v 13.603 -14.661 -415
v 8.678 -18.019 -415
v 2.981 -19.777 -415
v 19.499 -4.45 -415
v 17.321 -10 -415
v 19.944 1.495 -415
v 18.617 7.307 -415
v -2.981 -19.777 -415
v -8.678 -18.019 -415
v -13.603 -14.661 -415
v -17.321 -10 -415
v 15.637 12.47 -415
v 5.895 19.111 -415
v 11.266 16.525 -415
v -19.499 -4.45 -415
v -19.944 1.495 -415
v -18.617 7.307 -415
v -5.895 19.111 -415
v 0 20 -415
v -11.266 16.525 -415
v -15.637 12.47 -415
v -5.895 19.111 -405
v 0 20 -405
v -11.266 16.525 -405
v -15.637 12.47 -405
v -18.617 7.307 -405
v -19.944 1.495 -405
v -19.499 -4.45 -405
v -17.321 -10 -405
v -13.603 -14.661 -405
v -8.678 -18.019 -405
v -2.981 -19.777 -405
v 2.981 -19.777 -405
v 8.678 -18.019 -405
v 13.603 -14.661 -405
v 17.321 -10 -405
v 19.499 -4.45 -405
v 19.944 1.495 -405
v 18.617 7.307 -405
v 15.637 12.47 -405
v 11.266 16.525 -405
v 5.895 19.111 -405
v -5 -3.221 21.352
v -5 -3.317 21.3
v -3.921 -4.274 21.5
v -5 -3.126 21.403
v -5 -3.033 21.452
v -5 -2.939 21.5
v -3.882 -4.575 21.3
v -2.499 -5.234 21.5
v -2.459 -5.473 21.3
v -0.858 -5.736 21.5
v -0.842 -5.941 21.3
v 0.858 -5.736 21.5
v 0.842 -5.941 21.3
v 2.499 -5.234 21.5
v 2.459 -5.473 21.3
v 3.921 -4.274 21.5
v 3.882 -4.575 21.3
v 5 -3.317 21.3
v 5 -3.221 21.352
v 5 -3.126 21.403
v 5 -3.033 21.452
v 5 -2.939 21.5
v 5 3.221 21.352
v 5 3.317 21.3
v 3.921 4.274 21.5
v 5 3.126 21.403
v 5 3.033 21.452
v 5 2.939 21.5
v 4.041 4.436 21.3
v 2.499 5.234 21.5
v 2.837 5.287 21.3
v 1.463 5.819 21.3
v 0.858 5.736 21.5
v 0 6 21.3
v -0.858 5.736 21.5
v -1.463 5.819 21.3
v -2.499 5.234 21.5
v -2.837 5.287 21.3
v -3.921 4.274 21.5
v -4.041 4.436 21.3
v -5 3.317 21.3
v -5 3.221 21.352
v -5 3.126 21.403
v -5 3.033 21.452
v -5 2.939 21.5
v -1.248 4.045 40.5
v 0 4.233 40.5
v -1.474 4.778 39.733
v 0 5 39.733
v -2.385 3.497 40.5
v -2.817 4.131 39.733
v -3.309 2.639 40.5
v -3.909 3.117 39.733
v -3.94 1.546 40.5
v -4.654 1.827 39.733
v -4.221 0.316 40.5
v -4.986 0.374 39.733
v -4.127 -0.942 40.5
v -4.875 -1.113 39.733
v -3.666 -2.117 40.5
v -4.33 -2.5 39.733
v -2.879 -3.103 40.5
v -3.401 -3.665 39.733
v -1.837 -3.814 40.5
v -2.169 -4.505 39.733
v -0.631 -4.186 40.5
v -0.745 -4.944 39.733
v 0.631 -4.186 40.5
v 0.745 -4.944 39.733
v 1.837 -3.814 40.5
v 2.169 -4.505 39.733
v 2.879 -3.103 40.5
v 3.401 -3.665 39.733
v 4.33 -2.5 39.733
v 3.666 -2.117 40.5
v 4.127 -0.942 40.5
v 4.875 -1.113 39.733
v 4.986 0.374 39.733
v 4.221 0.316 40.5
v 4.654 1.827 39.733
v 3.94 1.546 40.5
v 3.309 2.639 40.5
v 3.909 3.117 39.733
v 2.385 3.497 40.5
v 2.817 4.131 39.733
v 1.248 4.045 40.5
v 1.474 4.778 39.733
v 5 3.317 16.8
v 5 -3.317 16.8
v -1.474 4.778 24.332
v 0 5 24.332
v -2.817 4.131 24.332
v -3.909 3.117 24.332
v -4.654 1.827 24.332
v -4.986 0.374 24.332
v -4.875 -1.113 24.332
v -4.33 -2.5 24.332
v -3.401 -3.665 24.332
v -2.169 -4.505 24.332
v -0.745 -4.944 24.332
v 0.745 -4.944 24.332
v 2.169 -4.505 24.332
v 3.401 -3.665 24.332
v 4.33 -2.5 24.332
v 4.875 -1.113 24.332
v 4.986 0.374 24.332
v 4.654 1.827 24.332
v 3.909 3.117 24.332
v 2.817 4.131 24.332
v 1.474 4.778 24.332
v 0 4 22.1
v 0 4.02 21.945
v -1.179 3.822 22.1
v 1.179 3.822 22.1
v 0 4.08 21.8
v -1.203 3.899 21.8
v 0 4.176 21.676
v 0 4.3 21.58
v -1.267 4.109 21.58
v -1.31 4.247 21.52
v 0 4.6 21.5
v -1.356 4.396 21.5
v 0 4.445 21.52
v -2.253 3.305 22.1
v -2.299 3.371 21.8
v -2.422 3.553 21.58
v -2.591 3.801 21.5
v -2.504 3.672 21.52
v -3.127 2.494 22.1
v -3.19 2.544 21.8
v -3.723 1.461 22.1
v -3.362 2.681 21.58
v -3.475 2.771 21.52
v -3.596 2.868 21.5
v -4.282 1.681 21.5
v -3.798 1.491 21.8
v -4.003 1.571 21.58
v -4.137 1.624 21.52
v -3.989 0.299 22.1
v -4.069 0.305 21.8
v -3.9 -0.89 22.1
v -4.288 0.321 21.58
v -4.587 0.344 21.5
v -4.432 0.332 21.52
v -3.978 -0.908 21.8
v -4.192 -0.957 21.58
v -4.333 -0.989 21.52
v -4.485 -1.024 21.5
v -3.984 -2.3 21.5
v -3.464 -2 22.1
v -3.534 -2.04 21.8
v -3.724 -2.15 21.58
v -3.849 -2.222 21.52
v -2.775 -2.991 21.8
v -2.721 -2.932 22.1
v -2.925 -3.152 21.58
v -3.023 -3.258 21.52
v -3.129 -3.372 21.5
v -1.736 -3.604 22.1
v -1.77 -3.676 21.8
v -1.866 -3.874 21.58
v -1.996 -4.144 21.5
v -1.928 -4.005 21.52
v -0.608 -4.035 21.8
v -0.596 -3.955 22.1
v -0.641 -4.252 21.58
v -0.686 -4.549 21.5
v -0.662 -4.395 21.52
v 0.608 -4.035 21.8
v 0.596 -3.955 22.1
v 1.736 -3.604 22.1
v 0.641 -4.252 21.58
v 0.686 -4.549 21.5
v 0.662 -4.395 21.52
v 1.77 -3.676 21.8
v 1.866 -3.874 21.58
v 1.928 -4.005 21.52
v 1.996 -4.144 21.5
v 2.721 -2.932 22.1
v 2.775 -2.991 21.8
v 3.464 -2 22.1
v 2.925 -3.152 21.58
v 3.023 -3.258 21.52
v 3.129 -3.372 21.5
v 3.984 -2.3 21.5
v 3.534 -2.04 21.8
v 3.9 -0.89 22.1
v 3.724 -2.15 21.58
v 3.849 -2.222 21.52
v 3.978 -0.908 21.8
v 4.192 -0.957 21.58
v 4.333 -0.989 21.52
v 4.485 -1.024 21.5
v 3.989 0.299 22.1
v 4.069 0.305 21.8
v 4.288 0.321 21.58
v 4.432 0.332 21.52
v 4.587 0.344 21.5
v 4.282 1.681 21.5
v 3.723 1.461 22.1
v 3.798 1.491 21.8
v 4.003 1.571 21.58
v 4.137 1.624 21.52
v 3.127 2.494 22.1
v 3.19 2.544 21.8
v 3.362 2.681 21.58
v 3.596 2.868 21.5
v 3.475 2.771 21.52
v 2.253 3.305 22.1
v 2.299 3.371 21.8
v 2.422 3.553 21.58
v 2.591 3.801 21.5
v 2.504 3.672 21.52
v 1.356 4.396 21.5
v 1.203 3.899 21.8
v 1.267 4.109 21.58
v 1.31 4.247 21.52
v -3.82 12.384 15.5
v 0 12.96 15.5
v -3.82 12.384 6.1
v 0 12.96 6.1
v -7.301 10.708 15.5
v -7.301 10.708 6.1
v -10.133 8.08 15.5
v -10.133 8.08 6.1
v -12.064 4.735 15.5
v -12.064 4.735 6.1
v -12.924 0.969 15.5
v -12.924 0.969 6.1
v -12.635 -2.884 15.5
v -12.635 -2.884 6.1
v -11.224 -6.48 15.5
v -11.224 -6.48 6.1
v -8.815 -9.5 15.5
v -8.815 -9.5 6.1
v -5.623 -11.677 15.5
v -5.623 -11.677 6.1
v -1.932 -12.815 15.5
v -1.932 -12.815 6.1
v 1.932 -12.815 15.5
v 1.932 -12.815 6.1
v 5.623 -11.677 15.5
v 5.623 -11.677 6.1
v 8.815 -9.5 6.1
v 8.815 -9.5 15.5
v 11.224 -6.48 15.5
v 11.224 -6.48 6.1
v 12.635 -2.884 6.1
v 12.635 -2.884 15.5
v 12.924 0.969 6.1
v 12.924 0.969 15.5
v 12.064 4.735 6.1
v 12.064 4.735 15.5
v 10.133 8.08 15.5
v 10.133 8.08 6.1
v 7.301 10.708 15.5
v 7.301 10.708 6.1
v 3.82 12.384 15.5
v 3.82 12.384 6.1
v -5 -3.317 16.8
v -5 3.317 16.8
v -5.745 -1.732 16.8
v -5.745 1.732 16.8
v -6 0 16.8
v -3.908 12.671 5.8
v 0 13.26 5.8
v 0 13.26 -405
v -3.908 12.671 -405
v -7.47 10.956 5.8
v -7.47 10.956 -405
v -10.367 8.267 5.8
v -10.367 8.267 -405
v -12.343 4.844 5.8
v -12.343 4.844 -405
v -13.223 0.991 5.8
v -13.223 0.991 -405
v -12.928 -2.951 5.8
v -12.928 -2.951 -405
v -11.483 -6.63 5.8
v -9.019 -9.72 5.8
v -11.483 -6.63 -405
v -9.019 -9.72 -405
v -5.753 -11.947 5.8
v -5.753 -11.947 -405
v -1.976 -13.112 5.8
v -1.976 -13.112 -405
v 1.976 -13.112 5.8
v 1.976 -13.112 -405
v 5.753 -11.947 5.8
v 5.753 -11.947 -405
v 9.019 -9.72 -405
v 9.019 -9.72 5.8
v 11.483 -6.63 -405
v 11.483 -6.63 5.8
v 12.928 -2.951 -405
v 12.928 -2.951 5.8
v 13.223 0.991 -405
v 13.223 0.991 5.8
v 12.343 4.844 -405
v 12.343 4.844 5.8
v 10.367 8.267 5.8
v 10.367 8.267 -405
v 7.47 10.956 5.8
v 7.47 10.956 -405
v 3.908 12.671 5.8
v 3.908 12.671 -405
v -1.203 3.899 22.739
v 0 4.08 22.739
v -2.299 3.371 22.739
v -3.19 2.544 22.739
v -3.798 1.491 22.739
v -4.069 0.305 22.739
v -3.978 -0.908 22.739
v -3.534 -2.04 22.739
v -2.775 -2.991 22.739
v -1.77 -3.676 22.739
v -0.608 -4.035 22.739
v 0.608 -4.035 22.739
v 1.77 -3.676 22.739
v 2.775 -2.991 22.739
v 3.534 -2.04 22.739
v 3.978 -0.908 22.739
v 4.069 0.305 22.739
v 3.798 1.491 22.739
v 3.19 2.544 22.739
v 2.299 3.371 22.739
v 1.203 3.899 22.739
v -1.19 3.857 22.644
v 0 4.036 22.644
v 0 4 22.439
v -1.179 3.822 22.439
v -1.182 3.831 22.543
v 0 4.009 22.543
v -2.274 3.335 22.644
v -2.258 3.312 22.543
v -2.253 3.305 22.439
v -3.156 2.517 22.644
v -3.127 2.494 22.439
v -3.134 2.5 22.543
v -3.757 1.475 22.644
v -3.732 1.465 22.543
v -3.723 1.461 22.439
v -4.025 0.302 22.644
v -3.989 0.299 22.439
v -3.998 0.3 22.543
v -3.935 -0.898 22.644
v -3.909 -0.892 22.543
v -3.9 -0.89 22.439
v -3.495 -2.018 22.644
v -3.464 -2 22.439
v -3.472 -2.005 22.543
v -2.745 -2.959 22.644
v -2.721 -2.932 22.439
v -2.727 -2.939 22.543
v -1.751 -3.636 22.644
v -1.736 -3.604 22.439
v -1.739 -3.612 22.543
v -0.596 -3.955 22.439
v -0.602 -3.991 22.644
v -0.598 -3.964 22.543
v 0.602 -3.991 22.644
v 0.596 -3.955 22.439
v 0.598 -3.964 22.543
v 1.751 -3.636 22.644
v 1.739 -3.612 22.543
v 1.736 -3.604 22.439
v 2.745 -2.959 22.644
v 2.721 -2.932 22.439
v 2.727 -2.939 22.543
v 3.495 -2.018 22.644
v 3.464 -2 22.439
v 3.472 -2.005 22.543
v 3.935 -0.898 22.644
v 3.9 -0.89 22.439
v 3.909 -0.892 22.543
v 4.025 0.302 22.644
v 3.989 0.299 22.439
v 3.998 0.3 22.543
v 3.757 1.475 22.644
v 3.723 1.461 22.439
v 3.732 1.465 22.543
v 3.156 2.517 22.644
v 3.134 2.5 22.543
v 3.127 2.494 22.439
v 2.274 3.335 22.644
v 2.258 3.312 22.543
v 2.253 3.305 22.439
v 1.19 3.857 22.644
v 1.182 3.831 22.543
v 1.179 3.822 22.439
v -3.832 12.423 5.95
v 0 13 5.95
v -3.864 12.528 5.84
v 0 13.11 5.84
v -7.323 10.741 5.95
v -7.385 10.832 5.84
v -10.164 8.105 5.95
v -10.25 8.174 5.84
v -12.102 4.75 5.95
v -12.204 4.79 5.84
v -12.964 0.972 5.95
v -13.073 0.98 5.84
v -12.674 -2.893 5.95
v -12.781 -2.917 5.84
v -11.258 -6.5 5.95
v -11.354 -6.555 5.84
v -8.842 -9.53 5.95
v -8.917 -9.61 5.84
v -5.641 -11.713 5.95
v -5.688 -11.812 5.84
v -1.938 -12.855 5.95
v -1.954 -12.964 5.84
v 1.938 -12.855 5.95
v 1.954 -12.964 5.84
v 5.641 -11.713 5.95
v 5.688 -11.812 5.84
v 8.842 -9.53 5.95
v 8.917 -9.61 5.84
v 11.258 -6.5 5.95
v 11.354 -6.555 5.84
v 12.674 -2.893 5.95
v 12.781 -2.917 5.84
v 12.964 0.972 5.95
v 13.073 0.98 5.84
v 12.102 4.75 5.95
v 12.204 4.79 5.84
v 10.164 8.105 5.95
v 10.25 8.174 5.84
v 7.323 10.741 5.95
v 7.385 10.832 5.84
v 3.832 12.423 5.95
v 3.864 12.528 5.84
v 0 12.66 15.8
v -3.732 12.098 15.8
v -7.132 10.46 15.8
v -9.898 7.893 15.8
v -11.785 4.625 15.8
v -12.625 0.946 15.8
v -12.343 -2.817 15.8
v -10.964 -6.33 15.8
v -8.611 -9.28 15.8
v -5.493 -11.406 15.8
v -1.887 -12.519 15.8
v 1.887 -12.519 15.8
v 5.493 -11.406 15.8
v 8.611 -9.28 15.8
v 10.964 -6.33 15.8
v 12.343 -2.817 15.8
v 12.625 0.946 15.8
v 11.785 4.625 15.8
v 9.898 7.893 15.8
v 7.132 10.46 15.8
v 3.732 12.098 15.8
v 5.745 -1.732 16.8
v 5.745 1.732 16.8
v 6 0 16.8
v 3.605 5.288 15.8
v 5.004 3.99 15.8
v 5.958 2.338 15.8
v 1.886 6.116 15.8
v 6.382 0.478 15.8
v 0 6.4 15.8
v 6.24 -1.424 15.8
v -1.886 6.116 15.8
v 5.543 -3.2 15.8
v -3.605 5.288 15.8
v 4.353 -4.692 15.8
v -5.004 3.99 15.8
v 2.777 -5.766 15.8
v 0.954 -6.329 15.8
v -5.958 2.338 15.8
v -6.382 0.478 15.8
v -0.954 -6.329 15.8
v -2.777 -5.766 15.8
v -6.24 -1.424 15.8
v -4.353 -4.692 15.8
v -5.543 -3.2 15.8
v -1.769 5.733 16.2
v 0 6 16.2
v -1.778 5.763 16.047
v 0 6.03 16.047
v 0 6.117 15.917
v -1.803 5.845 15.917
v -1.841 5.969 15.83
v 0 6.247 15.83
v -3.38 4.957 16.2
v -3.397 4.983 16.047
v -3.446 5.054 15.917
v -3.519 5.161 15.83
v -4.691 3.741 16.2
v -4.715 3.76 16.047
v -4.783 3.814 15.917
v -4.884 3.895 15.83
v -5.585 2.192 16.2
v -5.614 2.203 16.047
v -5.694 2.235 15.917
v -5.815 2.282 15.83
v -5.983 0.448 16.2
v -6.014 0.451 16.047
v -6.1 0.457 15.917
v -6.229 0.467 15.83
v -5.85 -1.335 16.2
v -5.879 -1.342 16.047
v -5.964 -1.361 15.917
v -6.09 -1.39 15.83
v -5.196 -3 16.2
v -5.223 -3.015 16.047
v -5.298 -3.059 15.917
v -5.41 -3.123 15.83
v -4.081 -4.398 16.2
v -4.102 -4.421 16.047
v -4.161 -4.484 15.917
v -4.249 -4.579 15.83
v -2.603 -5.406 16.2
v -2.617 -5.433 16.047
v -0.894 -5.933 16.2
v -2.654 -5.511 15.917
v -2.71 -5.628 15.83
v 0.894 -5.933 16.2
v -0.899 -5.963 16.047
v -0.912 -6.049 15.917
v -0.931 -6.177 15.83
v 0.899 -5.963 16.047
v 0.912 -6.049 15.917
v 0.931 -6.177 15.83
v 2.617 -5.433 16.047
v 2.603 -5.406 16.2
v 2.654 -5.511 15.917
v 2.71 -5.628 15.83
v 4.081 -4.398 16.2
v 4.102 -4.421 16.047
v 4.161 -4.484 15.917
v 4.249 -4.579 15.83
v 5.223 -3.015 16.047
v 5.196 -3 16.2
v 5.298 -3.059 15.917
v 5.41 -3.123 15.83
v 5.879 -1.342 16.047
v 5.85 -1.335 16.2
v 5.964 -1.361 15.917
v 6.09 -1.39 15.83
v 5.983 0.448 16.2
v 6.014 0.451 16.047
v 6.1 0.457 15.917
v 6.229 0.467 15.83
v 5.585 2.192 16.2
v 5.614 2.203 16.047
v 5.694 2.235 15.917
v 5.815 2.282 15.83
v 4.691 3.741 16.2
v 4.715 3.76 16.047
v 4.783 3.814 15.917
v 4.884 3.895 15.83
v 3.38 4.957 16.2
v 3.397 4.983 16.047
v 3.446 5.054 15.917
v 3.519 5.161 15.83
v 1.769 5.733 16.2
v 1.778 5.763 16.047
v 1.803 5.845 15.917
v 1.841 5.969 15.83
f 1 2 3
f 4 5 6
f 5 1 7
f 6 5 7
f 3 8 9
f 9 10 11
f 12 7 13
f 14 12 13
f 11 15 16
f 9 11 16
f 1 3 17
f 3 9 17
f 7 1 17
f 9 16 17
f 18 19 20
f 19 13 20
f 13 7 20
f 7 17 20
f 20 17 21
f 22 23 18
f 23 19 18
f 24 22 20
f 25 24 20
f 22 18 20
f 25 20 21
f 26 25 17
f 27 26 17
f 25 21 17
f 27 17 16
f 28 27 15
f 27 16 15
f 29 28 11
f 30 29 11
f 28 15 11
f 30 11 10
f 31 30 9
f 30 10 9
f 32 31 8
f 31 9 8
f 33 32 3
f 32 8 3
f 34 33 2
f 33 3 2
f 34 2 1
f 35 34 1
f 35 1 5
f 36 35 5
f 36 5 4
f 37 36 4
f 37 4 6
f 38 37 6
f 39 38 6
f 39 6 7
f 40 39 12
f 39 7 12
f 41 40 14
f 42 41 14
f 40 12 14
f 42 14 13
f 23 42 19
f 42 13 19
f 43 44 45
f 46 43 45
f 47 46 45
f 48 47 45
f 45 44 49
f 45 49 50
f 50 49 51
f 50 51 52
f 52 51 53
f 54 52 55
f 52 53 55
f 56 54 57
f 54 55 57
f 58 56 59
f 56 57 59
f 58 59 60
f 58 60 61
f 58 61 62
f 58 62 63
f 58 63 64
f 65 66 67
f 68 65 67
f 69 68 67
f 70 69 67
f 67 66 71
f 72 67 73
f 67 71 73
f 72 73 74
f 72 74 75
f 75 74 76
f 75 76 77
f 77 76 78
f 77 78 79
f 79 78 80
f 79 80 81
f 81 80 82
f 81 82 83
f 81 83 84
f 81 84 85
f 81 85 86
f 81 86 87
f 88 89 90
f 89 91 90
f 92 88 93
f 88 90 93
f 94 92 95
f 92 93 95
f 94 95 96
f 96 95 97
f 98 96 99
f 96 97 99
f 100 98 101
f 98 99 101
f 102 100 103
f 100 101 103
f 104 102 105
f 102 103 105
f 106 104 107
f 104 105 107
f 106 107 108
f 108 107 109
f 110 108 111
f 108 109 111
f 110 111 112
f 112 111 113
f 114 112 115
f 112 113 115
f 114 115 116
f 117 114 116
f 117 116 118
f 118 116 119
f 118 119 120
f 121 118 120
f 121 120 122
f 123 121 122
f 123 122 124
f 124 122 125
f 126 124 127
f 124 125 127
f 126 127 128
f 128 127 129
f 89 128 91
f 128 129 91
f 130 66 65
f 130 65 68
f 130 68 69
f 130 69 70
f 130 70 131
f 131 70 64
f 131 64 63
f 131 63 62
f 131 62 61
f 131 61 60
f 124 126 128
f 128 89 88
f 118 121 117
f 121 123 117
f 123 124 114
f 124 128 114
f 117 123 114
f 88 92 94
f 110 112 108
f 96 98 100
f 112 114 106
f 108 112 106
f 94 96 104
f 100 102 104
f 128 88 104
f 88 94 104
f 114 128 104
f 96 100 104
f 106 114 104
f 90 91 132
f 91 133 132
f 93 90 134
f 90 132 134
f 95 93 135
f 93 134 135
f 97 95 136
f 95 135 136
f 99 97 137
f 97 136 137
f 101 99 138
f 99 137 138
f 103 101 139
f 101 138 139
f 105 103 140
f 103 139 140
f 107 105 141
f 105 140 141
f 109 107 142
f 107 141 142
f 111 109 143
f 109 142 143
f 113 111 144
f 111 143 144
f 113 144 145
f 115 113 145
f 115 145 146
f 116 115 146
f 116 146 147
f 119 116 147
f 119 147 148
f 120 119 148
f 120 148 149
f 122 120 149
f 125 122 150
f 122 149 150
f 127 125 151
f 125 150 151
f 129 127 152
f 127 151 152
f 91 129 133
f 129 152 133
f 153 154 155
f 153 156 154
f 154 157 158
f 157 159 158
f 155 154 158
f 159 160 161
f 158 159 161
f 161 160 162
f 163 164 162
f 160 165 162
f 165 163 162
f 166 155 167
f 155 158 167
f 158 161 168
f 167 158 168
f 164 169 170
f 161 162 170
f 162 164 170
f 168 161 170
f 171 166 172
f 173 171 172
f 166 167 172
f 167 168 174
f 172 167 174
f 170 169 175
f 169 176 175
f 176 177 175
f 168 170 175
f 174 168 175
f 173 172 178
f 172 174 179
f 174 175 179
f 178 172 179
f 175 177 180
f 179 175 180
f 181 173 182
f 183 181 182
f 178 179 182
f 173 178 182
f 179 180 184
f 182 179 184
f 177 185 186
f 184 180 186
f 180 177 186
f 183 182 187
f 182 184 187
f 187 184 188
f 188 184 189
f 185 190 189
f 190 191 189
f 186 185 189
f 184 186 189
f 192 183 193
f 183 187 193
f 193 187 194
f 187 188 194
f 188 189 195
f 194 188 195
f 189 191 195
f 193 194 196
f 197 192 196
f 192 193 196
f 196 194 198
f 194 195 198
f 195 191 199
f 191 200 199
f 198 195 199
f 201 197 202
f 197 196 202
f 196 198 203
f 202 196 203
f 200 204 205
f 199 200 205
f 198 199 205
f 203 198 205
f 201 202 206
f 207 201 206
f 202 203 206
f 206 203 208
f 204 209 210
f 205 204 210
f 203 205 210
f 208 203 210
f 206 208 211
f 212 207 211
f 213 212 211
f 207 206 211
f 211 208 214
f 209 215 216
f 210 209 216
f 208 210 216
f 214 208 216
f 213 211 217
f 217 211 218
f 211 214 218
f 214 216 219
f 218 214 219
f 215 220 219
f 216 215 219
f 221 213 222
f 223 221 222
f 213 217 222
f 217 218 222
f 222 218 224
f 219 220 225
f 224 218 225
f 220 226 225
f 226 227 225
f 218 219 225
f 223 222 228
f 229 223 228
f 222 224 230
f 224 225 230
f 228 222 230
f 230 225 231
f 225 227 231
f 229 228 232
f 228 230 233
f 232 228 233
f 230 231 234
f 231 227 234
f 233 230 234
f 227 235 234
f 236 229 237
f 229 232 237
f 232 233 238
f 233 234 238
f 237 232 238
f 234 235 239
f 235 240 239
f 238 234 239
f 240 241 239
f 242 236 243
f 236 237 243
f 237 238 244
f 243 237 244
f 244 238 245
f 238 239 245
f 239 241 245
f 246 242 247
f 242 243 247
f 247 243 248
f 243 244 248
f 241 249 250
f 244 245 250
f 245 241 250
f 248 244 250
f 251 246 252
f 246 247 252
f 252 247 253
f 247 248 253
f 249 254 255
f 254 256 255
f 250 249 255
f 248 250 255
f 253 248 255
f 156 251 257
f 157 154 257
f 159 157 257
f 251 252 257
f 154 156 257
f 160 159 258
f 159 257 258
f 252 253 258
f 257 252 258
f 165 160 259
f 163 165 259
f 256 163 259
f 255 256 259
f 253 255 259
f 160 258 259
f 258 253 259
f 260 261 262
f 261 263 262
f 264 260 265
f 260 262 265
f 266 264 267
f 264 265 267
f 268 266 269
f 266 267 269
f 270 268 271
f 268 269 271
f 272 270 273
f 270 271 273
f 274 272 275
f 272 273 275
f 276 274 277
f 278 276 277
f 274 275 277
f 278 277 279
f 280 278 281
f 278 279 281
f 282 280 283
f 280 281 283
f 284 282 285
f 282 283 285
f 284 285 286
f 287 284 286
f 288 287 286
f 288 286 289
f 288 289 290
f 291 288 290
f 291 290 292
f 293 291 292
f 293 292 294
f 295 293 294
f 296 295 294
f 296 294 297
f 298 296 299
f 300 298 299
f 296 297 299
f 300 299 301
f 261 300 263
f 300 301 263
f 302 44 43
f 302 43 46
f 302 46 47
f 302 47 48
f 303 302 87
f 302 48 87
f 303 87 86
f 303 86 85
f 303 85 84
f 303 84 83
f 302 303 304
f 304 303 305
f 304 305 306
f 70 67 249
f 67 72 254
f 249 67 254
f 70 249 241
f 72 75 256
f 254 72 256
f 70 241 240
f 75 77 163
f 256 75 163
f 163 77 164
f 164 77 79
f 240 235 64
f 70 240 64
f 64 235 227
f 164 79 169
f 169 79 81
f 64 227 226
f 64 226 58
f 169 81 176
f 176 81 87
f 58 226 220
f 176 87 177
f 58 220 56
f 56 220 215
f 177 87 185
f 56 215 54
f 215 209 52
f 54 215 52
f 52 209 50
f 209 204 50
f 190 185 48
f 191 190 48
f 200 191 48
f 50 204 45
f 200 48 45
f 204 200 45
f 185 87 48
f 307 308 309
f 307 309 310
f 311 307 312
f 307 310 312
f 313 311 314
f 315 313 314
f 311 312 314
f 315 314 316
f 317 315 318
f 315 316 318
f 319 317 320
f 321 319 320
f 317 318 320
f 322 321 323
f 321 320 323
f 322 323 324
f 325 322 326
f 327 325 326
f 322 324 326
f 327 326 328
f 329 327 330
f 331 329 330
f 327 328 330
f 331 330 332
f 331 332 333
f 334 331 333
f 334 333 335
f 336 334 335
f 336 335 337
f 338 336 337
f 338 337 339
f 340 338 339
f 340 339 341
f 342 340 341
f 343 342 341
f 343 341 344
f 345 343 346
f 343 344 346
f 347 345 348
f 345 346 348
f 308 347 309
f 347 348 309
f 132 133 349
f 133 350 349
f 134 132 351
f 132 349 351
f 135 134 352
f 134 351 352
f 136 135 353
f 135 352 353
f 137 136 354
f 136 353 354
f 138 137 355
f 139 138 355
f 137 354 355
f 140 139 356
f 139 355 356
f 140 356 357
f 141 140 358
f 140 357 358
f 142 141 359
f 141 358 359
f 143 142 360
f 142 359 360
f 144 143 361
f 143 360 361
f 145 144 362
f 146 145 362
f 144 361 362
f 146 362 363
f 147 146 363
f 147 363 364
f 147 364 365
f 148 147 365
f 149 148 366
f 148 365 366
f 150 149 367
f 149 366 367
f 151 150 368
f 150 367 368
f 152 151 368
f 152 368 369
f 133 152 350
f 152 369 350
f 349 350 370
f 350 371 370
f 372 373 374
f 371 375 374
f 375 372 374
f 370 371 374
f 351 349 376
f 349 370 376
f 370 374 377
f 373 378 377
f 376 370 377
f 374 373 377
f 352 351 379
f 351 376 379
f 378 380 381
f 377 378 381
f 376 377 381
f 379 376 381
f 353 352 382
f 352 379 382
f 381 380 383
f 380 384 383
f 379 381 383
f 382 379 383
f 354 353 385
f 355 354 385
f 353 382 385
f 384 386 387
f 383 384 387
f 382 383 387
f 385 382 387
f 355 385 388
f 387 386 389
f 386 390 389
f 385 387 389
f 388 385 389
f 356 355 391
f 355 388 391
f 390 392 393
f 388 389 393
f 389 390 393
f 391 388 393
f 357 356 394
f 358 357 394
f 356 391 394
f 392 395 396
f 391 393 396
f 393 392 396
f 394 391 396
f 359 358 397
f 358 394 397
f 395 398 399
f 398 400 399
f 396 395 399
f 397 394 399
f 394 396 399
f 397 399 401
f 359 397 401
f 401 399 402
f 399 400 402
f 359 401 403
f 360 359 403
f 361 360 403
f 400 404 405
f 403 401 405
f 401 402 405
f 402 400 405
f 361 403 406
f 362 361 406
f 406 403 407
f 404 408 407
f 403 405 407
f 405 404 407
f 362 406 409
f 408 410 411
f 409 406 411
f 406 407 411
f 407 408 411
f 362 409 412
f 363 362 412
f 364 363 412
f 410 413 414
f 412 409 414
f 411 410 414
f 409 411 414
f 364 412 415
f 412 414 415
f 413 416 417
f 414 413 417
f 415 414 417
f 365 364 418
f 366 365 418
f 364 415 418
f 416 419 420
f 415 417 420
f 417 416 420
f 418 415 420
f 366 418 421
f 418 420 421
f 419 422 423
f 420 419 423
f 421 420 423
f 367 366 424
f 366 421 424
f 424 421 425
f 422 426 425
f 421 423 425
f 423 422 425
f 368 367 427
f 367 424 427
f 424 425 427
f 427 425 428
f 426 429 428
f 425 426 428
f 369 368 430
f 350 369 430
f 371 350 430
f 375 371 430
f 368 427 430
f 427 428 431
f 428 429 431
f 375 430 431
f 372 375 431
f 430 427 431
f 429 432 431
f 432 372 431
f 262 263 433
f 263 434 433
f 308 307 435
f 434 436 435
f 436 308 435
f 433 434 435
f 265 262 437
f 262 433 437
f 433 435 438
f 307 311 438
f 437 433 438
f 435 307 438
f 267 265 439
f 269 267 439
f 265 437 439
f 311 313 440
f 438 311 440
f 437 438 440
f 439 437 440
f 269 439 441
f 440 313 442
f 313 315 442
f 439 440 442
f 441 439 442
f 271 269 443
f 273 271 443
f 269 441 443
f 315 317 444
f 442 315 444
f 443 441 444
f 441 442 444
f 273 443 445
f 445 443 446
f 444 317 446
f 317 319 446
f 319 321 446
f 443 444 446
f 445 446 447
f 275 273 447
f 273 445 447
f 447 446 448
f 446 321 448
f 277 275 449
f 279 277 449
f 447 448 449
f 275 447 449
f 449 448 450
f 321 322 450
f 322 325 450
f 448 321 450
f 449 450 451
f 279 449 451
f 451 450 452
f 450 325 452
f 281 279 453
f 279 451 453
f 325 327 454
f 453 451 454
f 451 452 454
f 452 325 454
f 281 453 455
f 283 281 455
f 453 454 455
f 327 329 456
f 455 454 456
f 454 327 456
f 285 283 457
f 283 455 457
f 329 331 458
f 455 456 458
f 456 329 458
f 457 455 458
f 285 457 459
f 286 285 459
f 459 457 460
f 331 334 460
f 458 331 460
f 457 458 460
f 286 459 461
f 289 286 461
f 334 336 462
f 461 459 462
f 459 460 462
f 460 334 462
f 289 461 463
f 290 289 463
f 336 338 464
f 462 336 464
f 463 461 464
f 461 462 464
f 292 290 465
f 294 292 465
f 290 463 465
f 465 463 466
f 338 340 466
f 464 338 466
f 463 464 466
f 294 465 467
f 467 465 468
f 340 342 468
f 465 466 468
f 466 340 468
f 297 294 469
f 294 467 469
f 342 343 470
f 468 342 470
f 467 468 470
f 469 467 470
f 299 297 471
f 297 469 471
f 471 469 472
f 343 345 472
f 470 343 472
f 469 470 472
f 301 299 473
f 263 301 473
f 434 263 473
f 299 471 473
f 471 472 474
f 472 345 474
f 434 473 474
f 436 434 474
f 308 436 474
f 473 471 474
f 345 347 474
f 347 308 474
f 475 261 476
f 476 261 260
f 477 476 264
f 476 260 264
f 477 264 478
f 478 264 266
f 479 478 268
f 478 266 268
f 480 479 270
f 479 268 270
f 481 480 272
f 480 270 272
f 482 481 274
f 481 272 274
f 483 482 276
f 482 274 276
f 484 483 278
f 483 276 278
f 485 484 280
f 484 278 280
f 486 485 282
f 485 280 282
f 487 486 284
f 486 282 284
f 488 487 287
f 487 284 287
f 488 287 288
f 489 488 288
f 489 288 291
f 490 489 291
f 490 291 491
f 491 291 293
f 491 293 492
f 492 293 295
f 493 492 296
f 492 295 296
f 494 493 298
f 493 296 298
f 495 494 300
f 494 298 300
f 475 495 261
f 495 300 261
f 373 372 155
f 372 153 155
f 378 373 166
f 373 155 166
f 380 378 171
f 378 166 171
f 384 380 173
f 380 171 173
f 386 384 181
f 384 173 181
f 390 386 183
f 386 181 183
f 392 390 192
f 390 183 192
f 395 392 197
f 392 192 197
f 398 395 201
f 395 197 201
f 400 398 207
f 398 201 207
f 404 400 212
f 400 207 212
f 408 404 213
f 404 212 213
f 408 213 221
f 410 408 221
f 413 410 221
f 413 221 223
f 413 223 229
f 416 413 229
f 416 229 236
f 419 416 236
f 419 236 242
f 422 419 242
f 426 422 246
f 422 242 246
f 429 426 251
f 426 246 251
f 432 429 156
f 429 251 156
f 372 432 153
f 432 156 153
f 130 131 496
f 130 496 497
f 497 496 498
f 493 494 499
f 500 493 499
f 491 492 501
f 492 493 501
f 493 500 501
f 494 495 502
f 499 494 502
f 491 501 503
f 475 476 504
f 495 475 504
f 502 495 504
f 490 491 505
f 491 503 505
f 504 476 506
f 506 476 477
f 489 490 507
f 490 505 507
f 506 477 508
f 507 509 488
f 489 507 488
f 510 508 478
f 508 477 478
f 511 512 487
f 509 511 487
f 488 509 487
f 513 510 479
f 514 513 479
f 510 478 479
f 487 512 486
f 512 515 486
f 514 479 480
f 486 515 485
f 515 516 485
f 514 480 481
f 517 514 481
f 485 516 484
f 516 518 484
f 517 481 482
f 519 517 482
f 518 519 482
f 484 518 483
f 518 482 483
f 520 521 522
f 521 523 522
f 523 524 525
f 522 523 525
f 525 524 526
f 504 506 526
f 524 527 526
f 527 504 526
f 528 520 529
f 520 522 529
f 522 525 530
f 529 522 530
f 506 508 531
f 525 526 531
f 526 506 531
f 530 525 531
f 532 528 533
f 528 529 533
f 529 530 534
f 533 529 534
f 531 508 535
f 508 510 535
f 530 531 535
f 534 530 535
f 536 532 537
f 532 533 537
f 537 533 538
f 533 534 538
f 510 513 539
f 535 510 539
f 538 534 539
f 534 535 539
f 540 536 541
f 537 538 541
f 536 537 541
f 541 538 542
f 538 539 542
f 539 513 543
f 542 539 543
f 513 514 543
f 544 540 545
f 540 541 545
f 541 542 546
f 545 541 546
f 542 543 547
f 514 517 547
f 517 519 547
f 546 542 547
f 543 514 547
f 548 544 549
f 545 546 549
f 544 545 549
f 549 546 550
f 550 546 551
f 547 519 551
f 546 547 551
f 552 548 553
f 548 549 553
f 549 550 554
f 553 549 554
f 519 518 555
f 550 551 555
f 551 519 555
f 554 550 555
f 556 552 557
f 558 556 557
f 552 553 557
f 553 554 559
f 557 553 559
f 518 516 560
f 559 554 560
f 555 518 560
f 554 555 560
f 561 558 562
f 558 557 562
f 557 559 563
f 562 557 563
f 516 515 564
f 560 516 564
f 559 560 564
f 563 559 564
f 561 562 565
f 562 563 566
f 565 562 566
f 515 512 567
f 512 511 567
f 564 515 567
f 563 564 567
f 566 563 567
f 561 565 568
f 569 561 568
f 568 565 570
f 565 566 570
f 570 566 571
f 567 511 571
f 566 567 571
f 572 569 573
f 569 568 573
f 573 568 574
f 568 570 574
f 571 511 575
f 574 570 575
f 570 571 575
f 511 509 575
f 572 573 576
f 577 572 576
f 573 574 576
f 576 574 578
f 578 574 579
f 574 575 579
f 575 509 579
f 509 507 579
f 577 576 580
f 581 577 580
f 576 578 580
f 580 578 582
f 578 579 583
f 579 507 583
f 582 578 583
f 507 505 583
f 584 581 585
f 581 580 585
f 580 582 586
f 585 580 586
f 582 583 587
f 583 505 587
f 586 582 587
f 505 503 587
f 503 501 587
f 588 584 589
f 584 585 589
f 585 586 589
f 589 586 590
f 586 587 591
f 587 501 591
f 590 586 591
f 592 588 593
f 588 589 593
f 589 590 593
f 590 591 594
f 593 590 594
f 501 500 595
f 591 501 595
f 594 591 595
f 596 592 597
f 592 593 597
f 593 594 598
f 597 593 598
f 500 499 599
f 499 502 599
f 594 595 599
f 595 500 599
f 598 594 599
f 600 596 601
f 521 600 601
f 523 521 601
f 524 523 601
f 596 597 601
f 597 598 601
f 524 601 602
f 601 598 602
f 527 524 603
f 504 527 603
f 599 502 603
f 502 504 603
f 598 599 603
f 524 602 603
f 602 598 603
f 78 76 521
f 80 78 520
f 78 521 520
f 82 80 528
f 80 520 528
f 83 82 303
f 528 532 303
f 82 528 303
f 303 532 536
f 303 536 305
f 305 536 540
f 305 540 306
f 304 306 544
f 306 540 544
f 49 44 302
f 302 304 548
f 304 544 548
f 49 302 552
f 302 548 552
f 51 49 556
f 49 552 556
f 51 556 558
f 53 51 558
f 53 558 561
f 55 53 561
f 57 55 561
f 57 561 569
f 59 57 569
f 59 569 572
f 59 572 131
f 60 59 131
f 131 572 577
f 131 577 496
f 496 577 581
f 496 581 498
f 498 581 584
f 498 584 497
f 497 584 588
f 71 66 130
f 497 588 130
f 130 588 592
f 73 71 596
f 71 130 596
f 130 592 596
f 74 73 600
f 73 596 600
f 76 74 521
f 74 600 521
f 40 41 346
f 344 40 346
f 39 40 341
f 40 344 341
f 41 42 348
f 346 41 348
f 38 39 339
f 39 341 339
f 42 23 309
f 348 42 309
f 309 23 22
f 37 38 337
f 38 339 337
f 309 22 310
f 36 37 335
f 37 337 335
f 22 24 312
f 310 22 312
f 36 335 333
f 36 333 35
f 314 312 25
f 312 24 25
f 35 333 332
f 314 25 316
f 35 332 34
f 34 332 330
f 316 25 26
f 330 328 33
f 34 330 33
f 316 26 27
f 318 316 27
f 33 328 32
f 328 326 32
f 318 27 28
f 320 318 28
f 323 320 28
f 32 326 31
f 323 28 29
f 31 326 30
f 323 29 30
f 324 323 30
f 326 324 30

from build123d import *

# Parameters (mm, degrees)
CUT_EXTRUDE1_DEPTH = 4.7


with BuildPart() as part:
    # Sketch1 → Revolve1 (revolve)
    with BuildSketch(Plane(origin=(0, 0, 0), x_dir=(0, 0, -1), z_dir=(1, 0, 0))):
        with BuildLine():
            Line((-21.5, 0), (-21.5, 5.8))
            Line((-21.5, 5.8), (-21.3, 6))
            Line((-21.3, 6), (-16.2, 6))
            ThreePointArc((-16.2, 6), (-15.917157288, 6.117157288), (-15.8, 6.4))
            Line((-15.8, 6.4), (-15.8, 12.66))
            Line((-15.8, 12.66), (-15.5, 12.96))
            Line((-15.5, 12.96), (-6.1, 12.96))
            ThreePointArc((-6.1, 12.96), (-5.887867966, 13.047867966), (-5.8, 13.26))
            Line((-5.8, 13.26), (405, 13.26))
            Line((405, 13.26), (405, 20))
            Line((405, 20), (415, 20))
            Line((415, 20), (415, 0))
            Line((415, 0), (-21.5, 0))
        make_face()
    revolve(axis=Axis((0, 0, -415), (0, 0, 1)))

    # Sketch2 → Revolve2 (revolve)
    with BuildSketch(Plane(origin=(0, 0, 0), x_dir=(0, 0, -1), z_dir=(1, 0, 0))):
        with BuildLine():
            Line((-40.5, 0), (-40.5, 4.233))
            Line((-40.5, 4.233), (-39.733, 5))
            Line((-39.733, 5), (-24.332050808, 5))
            Line((-24.332050808, 5), (-22.739230485, 4.080384758))
            ThreePointArc((-22.739230485, 4.080384758), (-22.594521912, 4.020444504), (-22.439230485, 4))
            Line((-22.439230485, 4), (-22.1, 4))
            ThreePointArc((-22.1, 4), (-21.675735931, 4.175735931), (-21.5, 4.6))
            Line((-21.5, 4.6), (-21.5, 0))
            Line((-21.5, 0), (-40.5, 0))
        make_face()
    revolve(axis=Axis((0, 0, 21.5), (0, 0, 1)))

    # Sketch3 → Cut-Extrude1 (cut)
    with BuildSketch(Plane.XY.offset(21.5)):
        Polygon((-7, 8), (-7, -6), (-5, -6), (-5, 6), (5, 6), (5, -6), (7, -6), (7, 8), align=None)
    extrude(amount=-CUT_EXTRUDE1_DEPTH, mode=Mode.SUBTRACT)


solid = part.part
